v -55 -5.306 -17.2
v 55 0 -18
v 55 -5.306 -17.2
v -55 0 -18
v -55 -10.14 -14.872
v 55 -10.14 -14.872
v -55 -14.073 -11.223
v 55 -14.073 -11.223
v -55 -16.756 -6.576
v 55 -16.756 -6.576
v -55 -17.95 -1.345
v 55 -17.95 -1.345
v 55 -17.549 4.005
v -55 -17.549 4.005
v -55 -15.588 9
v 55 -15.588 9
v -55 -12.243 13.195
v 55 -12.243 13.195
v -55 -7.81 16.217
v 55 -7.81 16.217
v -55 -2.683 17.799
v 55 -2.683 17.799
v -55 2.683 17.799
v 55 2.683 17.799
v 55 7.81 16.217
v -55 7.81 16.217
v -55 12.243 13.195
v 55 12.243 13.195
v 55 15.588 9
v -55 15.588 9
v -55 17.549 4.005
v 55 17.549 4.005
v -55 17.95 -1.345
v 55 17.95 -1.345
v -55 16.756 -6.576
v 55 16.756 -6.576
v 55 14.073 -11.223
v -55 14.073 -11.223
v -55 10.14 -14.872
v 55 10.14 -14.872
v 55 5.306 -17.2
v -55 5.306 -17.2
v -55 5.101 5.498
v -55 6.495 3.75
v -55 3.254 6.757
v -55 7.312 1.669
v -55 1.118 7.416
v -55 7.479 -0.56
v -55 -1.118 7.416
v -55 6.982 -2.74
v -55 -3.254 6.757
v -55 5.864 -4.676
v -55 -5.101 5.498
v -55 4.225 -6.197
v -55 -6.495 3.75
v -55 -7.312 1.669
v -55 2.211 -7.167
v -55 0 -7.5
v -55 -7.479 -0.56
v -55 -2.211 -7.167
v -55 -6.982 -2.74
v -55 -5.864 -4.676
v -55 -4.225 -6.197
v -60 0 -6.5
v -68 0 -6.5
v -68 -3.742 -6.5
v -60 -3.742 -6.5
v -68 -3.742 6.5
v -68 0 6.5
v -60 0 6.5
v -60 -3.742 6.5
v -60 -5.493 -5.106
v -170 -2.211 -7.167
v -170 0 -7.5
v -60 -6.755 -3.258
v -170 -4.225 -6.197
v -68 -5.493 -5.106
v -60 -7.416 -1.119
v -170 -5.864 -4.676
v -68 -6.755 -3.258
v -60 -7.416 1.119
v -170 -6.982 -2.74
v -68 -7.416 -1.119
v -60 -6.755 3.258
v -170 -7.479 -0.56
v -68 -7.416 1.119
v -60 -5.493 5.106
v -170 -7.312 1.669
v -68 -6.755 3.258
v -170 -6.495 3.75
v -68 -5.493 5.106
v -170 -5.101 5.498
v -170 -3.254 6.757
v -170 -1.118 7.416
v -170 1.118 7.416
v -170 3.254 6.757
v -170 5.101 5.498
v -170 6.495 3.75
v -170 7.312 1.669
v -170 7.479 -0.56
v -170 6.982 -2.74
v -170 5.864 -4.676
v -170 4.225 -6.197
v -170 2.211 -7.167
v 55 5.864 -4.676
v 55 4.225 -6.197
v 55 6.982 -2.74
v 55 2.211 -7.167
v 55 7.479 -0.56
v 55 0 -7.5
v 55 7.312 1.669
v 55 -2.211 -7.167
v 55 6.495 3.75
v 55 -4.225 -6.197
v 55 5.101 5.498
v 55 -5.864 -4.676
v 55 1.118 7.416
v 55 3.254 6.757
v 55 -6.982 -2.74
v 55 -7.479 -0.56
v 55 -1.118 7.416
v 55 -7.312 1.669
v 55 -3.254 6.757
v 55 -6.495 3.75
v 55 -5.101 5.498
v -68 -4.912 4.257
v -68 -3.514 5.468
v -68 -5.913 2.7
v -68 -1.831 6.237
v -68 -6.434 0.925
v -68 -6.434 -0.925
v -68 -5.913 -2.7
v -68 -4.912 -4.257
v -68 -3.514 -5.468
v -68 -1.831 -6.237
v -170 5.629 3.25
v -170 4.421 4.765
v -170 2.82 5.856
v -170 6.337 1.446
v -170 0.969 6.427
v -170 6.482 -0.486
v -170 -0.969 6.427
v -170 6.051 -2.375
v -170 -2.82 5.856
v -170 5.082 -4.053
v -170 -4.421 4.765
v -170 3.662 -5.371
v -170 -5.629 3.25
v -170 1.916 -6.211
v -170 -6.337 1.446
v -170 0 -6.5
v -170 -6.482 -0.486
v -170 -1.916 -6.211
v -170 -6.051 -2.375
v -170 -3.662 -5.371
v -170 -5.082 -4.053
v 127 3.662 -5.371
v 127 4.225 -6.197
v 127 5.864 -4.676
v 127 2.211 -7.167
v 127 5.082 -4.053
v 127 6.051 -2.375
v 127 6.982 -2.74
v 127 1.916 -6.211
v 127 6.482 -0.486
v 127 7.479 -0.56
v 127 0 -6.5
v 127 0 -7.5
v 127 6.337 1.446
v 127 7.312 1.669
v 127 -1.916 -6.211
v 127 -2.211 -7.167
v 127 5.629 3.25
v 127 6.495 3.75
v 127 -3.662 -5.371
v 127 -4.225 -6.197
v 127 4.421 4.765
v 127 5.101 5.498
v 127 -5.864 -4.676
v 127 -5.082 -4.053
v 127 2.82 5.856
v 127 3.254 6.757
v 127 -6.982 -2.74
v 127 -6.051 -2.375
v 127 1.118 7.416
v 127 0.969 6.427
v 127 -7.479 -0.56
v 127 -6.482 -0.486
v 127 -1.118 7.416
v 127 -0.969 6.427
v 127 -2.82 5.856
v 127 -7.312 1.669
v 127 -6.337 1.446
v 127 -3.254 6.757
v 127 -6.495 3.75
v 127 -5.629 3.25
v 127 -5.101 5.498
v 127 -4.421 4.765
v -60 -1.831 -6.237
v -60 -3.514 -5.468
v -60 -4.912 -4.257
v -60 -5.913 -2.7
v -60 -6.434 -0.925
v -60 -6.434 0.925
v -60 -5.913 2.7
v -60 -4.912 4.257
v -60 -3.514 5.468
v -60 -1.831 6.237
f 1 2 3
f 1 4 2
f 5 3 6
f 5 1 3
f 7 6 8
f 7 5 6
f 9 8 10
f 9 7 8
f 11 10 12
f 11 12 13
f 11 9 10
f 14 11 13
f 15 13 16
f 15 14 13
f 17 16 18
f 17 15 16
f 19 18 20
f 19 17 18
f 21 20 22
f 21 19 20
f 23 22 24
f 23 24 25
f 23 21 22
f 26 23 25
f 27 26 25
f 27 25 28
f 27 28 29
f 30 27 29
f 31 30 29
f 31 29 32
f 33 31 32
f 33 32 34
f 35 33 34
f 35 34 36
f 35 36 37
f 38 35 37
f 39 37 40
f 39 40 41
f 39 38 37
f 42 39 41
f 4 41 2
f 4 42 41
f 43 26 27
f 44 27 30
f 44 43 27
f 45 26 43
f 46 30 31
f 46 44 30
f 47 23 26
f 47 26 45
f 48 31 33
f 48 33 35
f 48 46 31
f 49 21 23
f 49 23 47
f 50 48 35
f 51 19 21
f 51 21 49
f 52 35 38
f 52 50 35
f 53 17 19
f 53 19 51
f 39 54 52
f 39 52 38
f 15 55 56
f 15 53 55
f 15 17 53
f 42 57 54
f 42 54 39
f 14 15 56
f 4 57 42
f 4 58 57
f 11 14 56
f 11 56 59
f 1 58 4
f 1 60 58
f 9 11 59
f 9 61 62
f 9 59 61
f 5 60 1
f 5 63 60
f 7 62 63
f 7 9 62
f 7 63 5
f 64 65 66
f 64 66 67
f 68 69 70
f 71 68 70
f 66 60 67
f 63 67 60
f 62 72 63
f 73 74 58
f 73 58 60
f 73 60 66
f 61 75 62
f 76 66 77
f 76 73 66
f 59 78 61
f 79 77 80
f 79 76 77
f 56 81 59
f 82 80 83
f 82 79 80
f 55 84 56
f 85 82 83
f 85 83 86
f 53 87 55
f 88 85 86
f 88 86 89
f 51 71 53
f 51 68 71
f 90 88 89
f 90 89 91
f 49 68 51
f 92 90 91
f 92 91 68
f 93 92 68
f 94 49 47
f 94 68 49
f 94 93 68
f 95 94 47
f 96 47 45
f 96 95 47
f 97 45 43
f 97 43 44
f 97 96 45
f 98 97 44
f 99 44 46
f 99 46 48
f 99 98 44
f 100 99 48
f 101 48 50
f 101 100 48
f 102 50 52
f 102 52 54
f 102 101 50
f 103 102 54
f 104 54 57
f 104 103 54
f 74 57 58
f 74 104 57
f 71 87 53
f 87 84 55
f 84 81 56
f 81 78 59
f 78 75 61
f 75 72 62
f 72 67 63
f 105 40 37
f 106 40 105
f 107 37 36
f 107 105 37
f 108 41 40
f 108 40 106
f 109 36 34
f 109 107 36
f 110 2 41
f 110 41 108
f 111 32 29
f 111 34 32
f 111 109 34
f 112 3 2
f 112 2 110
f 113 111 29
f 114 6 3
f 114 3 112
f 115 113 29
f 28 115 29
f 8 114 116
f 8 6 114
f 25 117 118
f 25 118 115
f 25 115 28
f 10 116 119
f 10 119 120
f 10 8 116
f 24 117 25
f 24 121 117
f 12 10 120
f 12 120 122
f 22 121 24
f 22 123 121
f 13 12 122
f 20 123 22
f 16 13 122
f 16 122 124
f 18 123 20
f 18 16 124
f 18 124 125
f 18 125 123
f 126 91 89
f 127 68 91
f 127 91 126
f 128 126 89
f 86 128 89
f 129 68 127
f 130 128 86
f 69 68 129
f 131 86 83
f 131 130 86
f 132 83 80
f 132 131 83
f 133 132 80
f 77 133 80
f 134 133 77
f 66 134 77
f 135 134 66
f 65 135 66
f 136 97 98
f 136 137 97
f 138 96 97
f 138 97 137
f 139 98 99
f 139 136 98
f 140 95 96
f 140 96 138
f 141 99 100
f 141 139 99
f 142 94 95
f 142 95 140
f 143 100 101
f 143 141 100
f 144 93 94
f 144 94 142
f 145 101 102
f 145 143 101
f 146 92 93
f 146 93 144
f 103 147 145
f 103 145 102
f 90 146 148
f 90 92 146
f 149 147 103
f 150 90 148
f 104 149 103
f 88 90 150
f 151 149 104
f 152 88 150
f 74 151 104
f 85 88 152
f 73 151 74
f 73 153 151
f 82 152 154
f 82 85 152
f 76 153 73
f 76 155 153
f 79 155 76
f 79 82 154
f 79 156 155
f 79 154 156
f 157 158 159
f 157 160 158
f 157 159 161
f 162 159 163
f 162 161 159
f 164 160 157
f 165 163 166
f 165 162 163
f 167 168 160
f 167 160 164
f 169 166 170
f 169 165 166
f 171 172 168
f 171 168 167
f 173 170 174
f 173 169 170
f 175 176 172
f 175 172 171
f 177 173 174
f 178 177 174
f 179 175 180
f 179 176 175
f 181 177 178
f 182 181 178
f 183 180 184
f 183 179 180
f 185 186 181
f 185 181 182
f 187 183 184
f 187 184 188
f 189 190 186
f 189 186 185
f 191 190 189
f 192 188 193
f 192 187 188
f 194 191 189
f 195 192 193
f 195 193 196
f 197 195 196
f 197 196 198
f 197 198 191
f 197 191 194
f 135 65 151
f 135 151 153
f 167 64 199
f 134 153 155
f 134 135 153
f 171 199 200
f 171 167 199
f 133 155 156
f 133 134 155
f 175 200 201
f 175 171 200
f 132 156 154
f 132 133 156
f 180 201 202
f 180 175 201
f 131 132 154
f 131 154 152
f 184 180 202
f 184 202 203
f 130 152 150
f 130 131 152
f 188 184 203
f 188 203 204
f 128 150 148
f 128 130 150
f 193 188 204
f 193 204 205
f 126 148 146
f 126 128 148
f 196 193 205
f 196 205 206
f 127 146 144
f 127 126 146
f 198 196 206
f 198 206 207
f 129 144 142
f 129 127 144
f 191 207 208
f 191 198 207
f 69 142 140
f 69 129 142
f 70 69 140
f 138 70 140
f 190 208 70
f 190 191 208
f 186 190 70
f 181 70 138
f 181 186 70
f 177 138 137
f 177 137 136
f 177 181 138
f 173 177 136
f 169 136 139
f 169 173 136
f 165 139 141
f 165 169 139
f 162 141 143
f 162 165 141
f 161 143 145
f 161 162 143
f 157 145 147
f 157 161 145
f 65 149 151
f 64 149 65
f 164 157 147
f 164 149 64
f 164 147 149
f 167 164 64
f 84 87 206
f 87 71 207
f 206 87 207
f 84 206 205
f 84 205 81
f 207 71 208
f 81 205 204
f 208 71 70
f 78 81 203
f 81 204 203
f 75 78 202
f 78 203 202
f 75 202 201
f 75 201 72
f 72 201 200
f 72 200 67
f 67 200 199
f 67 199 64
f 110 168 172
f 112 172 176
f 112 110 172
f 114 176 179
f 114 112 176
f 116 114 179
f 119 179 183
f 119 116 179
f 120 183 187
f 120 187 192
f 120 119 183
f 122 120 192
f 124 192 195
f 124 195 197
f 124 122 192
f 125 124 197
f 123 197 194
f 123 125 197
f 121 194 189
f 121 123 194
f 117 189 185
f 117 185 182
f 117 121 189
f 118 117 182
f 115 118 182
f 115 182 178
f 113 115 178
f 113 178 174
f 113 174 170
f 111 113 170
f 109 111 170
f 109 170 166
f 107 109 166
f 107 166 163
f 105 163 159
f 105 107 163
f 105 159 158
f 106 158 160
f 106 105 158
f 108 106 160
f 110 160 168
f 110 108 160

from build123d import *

# Parameters (mm, degrees)
CUT_EXTRUDE1_REACH      = 173.895
CUT_EXTRUDE1_END_RADIUS = 7.5
SKETCH2_W               = 8
SKETCH2_H               = 13


with BuildPart() as part:
    # Sketch1 → Revolve1 (revolve)
    with BuildSketch(Plane.XY, mode=Mode.PRIVATE) as revolve1_sk:
        Polygon((127, 6.5), (127, 7.5), (55, 7.5), (55, 18), (-55, 18), (-55, 7.5), (-170, 7.5), (-170, 6.5), align=None)
    revolve(revolve1_sk.sketch.rotate(Axis((196.356223274, 0, 0), (-1, 0, 0)), 90), axis=Axis((196.356223274, 0, 0), (-1, 0, 0)))

    # Cut-Extrude1: up to this cylinder (the profile starts inside it)
    cut_extrude1_end = Plane(origin=(-64, 0, 0), z_dir=(1, 0, 0)) * Cylinder(CUT_EXTRUDE1_END_RADIUS, 363.79, mode=Mode.PRIVATE)
    # Sketch2 → Cut-Extrude1 (cut, up to the surface)
    with BuildSketch(Plane(origin=(0, 0, 0), x_dir=(1, 0, 0), z_dir=(0, 1, 0)), mode=Mode.PRIVATE) as cut_extrude1_sk1:
        with Locations((-64, 0)):
            Rectangle(SKETCH2_W, SKETCH2_H)
    cut_extrude1_tool1 = extrude(cut_extrude1_sk1.sketch, amount=-CUT_EXTRUDE1_REACH, mode=Mode.PRIVATE) & cut_extrude1_end
    add(cut_extrude1_tool1.solids().sort_by_distance((-64, 0, 0))[0], mode=Mode.SUBTRACT)


solid = part.part
